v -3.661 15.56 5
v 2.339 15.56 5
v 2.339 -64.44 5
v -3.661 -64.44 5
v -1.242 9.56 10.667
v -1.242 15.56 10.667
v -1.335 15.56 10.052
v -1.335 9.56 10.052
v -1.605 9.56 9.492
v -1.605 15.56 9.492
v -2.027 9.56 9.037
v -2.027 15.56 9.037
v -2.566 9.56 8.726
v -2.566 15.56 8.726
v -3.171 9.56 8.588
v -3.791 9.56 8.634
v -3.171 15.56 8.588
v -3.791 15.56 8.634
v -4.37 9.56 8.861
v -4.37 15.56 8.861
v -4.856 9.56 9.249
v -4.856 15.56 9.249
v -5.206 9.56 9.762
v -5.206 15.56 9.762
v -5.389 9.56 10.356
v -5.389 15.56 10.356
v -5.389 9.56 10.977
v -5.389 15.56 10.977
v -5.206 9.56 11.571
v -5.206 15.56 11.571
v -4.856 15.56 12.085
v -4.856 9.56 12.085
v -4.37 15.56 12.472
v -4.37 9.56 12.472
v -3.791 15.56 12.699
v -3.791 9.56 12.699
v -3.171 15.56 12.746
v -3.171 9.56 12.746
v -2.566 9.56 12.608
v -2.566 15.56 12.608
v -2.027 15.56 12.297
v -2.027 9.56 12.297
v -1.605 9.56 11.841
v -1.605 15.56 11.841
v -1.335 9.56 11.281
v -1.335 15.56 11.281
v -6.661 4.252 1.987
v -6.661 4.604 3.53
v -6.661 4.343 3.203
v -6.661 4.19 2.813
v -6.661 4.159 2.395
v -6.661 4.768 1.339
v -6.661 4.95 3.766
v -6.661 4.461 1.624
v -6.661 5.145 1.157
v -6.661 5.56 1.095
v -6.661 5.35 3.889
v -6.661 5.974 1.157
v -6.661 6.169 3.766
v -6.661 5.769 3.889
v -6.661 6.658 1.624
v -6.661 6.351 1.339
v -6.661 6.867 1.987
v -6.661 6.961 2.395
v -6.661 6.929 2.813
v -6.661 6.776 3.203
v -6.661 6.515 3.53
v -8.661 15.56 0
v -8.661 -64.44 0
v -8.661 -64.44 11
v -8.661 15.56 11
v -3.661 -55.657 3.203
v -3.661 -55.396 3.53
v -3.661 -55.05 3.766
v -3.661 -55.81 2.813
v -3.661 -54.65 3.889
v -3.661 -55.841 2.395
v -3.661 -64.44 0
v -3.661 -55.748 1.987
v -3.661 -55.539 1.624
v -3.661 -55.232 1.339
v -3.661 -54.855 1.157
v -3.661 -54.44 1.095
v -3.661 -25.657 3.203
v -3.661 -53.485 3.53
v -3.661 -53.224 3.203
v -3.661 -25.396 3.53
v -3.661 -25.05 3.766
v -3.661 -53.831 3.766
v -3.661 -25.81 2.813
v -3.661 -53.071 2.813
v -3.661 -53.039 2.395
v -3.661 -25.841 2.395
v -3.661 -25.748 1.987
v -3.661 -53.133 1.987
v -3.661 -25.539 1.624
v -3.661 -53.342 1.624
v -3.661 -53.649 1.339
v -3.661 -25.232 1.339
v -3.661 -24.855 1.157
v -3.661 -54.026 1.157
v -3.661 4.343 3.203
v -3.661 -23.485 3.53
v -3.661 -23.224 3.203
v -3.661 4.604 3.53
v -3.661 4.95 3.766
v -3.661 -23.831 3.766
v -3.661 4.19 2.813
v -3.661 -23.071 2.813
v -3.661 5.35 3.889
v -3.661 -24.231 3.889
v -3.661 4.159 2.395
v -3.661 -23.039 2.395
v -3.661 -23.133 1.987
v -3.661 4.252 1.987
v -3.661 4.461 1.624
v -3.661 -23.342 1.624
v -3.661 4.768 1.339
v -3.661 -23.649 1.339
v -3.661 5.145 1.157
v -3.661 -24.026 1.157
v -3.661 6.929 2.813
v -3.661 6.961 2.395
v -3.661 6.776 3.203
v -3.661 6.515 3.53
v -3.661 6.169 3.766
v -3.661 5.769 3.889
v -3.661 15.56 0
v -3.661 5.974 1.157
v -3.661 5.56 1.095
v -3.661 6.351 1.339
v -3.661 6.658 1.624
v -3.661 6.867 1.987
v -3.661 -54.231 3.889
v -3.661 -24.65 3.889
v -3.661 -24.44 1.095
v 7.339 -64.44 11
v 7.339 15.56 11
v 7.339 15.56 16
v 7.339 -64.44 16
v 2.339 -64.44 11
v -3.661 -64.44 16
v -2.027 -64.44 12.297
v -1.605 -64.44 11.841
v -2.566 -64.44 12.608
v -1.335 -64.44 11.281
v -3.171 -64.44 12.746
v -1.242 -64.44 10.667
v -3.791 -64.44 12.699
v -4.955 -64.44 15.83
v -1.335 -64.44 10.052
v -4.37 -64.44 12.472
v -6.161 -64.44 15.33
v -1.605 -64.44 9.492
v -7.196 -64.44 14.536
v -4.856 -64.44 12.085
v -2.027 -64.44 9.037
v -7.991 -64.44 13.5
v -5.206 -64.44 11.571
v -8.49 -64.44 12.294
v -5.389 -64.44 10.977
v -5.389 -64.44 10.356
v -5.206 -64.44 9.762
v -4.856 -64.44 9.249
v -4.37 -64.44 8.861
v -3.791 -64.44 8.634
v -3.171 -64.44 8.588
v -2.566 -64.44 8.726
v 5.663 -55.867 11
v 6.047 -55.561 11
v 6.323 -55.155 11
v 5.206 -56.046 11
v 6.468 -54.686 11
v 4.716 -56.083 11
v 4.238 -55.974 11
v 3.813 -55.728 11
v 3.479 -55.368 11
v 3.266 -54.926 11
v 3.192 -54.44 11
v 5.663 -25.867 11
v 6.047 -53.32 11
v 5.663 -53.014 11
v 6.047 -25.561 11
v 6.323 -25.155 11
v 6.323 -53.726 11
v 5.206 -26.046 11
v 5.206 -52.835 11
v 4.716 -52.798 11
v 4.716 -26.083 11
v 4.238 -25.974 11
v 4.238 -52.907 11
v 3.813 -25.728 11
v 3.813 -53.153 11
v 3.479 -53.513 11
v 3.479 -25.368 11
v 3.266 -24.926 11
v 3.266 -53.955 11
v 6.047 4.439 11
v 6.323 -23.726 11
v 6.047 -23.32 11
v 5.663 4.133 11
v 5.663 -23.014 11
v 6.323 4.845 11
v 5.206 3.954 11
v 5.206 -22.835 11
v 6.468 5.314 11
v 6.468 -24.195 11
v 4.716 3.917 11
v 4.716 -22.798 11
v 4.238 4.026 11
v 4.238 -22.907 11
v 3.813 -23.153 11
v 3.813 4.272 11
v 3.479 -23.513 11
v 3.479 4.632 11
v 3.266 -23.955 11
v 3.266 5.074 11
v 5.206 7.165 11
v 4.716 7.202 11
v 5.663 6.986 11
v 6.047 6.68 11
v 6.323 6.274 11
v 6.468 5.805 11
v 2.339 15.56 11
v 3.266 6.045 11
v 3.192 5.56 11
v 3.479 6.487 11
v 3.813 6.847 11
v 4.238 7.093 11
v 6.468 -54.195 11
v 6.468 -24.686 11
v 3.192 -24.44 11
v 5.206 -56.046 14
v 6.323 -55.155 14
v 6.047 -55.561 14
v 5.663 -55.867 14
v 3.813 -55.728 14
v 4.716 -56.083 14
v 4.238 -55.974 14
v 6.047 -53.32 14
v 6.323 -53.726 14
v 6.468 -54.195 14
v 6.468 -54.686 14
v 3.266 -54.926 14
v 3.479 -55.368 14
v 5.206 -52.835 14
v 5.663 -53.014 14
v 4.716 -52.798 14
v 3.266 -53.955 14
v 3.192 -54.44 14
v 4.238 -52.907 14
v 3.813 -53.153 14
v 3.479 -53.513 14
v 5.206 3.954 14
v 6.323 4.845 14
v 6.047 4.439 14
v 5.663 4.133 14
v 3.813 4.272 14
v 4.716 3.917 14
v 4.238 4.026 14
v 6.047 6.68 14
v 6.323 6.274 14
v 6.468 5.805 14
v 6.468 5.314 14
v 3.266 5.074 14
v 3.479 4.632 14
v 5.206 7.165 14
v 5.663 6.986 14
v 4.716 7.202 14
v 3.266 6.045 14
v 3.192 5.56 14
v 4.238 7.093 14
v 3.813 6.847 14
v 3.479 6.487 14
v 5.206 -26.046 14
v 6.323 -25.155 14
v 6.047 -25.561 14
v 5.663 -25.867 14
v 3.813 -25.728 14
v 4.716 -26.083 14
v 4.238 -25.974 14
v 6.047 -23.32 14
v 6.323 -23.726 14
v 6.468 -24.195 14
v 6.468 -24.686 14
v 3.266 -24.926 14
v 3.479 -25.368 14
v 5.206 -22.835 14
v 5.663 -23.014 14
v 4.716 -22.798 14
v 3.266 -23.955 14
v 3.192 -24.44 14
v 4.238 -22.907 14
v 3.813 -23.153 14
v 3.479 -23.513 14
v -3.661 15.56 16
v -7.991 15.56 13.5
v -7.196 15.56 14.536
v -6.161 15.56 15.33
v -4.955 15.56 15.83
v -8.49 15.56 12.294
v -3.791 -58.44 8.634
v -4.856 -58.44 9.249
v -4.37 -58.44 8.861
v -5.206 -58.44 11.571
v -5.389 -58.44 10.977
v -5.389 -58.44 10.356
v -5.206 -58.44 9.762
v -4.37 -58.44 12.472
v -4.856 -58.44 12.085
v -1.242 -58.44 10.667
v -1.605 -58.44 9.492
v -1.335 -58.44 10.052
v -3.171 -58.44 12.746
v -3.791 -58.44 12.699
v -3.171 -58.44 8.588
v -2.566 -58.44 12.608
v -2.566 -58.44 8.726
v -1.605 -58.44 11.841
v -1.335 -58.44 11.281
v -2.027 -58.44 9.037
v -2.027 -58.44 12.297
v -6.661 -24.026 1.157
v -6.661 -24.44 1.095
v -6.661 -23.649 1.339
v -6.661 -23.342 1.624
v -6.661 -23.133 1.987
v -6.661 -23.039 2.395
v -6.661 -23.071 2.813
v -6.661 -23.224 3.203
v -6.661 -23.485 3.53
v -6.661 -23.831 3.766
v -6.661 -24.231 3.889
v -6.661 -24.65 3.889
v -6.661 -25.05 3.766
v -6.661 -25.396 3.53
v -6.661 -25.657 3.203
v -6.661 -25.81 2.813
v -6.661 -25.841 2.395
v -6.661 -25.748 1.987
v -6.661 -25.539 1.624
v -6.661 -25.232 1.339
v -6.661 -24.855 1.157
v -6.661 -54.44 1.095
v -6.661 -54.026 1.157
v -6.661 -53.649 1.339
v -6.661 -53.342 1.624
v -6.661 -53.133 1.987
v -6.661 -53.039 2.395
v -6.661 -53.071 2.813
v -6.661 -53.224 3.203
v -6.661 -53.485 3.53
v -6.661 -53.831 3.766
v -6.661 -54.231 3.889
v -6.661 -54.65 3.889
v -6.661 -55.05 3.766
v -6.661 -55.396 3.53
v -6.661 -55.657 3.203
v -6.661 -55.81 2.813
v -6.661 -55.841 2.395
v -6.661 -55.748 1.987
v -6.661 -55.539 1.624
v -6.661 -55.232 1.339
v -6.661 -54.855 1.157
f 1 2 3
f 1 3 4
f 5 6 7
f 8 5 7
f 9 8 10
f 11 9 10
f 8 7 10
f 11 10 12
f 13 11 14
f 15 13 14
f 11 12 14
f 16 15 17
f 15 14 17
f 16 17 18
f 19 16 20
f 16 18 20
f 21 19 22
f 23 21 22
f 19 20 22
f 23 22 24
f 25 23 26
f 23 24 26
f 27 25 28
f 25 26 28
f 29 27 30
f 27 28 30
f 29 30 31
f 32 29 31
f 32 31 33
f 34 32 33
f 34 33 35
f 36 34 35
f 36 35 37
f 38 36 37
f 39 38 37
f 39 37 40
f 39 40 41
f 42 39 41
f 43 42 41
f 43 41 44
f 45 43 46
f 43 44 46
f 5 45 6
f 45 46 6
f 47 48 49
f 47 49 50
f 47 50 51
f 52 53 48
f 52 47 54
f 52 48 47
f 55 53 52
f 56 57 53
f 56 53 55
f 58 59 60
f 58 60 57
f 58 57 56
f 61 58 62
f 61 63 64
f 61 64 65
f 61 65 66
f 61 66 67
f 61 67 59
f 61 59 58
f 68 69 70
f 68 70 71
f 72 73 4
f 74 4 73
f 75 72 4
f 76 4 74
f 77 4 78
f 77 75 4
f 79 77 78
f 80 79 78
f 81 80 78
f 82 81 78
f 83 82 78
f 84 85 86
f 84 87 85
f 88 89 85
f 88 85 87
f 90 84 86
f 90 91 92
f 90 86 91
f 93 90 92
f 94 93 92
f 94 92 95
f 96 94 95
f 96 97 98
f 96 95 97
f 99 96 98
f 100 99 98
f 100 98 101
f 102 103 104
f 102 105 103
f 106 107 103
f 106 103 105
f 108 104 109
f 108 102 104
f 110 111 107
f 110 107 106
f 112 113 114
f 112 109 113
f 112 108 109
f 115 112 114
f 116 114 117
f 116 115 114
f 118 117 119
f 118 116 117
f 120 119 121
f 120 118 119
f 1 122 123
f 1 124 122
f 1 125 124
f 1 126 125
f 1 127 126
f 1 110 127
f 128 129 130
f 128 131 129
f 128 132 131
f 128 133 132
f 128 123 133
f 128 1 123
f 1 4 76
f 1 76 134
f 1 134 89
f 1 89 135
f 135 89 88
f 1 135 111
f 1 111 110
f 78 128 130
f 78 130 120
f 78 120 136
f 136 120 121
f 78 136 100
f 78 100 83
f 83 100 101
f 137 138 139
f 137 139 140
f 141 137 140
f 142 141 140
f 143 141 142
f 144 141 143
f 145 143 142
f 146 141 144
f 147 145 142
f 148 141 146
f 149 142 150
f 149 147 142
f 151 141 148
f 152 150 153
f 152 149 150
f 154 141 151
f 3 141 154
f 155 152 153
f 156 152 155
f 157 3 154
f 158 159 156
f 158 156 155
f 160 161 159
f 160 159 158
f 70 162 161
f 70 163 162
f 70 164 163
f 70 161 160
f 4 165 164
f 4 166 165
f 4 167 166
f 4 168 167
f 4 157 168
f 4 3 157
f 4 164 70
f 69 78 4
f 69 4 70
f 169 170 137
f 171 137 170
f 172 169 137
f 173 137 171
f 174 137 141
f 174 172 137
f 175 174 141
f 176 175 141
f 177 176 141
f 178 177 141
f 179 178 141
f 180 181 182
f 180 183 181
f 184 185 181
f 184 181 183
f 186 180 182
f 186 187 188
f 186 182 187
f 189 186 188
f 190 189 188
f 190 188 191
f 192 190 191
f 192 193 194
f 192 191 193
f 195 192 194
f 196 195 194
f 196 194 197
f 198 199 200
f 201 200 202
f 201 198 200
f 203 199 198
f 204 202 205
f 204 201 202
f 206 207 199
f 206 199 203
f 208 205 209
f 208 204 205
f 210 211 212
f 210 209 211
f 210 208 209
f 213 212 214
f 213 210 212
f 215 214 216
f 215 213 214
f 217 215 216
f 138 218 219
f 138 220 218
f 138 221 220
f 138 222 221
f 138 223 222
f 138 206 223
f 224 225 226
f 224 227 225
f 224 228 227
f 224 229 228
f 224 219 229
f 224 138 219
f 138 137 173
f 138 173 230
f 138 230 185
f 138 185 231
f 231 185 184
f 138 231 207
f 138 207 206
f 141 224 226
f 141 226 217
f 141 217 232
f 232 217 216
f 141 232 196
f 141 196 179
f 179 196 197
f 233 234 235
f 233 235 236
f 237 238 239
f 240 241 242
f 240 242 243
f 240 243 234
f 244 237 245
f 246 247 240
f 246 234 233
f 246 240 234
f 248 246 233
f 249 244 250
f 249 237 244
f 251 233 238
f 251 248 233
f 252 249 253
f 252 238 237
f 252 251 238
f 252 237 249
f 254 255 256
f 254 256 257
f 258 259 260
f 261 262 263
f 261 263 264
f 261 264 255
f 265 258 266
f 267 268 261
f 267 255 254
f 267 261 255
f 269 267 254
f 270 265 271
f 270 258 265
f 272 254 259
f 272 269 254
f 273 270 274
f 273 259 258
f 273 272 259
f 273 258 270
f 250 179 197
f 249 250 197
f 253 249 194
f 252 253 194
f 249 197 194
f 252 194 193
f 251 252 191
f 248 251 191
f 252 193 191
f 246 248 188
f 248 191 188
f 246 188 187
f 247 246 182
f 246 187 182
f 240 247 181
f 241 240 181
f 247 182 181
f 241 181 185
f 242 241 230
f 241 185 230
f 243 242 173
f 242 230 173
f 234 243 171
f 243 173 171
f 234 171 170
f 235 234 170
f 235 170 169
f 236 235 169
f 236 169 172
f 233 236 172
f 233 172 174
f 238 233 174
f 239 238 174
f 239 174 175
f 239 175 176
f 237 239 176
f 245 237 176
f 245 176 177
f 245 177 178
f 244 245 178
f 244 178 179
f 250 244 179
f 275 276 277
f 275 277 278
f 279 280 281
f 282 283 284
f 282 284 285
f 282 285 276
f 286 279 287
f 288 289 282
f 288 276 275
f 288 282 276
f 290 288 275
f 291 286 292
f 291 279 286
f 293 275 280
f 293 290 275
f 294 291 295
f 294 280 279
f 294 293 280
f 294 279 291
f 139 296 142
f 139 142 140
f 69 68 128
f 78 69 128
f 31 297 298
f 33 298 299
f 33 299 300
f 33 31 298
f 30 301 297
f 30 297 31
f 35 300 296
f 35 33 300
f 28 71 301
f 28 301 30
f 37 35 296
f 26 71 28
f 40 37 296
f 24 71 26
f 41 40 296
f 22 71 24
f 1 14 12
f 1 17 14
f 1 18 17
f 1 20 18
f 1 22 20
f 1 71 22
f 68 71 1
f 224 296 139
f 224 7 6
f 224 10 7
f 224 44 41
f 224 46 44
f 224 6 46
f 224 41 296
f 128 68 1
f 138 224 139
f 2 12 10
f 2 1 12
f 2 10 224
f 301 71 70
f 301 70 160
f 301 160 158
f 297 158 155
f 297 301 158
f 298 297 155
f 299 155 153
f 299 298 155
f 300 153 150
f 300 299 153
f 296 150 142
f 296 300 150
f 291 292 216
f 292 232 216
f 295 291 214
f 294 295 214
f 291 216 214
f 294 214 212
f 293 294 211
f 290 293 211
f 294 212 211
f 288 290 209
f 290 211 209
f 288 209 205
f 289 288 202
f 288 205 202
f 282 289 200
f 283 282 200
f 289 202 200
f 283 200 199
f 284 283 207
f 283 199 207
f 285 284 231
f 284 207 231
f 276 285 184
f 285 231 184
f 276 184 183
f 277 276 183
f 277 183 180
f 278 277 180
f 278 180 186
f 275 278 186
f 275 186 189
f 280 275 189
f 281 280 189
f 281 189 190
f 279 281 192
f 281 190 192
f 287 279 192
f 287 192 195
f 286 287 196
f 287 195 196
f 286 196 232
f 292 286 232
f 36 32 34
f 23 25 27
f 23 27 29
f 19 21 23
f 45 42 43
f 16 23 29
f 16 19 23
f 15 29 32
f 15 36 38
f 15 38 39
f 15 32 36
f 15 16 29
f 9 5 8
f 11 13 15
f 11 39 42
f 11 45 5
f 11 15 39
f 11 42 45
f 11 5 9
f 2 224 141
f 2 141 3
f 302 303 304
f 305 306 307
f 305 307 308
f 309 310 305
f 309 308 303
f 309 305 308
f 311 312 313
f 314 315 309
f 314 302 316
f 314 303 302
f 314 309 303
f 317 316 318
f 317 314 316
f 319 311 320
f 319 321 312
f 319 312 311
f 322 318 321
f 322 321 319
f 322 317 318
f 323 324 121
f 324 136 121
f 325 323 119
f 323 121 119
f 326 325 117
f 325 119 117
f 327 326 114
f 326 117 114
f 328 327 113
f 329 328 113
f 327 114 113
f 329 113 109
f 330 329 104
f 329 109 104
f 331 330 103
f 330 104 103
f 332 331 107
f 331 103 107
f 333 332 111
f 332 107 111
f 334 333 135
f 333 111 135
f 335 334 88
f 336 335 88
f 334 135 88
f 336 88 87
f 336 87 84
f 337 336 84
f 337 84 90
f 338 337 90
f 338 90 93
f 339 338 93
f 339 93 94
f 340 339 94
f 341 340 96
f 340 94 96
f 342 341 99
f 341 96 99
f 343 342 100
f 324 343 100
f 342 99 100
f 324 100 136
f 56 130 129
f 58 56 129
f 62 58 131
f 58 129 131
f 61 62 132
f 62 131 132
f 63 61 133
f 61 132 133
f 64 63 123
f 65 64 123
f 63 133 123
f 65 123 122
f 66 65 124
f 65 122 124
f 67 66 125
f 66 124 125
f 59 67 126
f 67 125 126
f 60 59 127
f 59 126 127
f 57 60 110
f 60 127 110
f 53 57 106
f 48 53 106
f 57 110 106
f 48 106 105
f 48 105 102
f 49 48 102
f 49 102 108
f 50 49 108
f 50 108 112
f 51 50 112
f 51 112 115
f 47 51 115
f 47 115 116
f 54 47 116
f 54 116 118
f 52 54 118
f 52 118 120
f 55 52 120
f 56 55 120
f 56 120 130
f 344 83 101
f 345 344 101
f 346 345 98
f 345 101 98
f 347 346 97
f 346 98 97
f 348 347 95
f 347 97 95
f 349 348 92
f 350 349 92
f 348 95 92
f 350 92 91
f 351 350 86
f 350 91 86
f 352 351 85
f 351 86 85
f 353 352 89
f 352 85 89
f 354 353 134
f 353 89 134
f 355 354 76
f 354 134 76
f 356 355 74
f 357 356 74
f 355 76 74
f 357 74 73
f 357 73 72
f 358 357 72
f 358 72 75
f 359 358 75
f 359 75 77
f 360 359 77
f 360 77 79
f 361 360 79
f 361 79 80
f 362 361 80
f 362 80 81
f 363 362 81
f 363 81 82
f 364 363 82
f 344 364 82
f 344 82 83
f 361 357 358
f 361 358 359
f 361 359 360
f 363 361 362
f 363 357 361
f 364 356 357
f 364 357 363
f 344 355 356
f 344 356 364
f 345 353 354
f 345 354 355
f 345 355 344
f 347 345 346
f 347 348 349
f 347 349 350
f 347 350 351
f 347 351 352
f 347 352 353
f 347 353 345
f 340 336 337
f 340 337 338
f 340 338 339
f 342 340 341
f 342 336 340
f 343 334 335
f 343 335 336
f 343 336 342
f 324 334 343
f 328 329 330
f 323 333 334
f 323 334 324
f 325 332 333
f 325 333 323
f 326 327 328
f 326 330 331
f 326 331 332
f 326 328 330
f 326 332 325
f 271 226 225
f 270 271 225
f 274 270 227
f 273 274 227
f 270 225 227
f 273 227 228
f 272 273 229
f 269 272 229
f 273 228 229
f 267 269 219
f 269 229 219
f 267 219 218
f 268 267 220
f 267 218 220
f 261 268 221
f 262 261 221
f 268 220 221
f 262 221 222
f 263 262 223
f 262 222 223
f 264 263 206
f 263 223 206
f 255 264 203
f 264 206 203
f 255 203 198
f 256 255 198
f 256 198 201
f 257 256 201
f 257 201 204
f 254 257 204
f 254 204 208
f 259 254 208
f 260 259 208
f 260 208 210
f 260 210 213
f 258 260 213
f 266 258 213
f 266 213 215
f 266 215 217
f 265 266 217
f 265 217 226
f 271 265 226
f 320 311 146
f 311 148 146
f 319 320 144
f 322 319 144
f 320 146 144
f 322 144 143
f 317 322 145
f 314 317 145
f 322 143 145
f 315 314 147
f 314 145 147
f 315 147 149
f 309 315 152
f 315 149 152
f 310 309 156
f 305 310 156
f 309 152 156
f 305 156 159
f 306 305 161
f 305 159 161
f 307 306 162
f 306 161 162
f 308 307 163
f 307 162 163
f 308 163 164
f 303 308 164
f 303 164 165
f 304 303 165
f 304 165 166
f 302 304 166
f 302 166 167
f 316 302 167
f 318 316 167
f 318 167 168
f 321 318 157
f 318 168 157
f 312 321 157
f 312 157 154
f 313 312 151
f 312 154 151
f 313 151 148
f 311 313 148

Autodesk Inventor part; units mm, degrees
ref_plane "YZ Plane" through (0, 0, 0) normal (1, 0, 0) x (0, 1, 0)
ref_plane "XZ Plane" through (0, 0, 0) normal (0, 1, 0) x (-1, 0, 0)
ref_plane "XY Plane" through (0, 0, 0) normal (0, 0, 1) x (1, 0, 0)
sketch "Sketch1" plane through (0, 0, 0) normal (0, 0, 1) x (1, 0, 0)
  line L0 (-8.6606, 15.5596) -> (7.3394, 15.5596)
  line L1 (7.3394, 15.5596) -> (7.3394, -64.4404)
  line L2 (7.3394, -64.4404) -> (-8.6606, -64.4404)
  line L3 (-8.6606, -64.4404) -> (-8.6606, 15.5596)
  point P0 (0, 0)
  dimension "d2" = 16
  dimension "d3" = 80
extrude "Extrusion1" add sketch "Sketch1" along normal blind 16
sketch "Sketch2" plane through (-8.6606, 15.5596, 0) normal (0, 1, 0) x (1, 0, 0)
  line L0 (16, 0) -> (16, -16) projected
  line L1 (16, -11) -> (11, -11)
  line L2 (11, -11) -> (11, -5)
  line L3 (11, -5) -> (16, -5)
  line L4 (16, -5) -> (16, -11)
  line L5 (16, 0) -> (0, 0) projected
  line L6 (5, 0) -> (11, 0)
  line L7 (11, 0) -> (11, -5)
  line L8 (11, -5) -> (5, -5)
  line L9 (5, -5) -> (5, 0)
  line L10 (16, -16) -> (0, -16) projected
  line L11 (0, 0) -> (0, -16) projected
  point P0 (8.6606, 0)
  point P1 (5, -16)
  point P2 (0, -11)
  dimension "d5" = 5
  dimension "d6" = 5
  dimension "d7" = 5
  dimension "d8" = 5
  dimension "d9" = 5
  dimension "d10" = 5
extrude "Extrusion2" cut sketch "Sketch2" against normal blind 80 contours L0 L3 L7 L5 | L0 L1 L2 L3 | L7 L8 L9 L5
sketch "Sketch4" plane through (-8.6606, 15.5596, 16) normal (0, 1, 0) x (1, 0, 0)
  line L0 (6.9788, 8.1833) -> (8.6242, 5.3333)
  line L1 (8.6242, 5.3333) -> (6.9788, 2.4833)
  line L2 (6.9788, 2.4833) -> (3.6879, 2.4833)
  line L3 (3.6879, 2.4833) -> (2.0424, 5.3333)
  line L4 (2.0424, 5.3333) -> (3.6879, 8.1833)
  line L5 (3.6879, 8.1833) -> (6.9788, 8.1833)
  line L6 (16, 0) -> (0, 0) projected
  line L7 (0, 16) -> (0, 0) projected
  circle A0 centre (5.3333, 5.3333) radius 2.085
  point P0 (8.6606, 16)
  dimension "d13" = 5.3333
  dimension "d14" = 5.3333
  dimension "d15" = 5.7
  dimension "d23" = 4.17
extrude "Extrusion3" cut sketch "Sketch4" against normal blind 6 from surface at 0 contours A0
sketch "Sketch5" plane through (-8.6606, -64.4404, 16) normal (0, -1, 0) x (1, 0, 0)
  line L0 (3.6879, -2.4833) -> (2.0424, -5.3333) projected
  line L1 (3.6879, -2.4833) -> (6.9788, -2.4833)
  line L2 (6.9788, -2.4833) -> (8.6242, -5.3333)
  line L3 (8.6242, -5.3333) -> (6.9788, -8.1833)
  line L4 (6.9788, -8.1833) -> (3.6879, -8.1833)
  line L5 (3.6879, -8.1833) -> (2.0424, -5.3333)
  line L6 (2.0424, -5.3333) -> (3.6879, -2.4833)
  line L7 (0, 0) -> (16, 0) projected
  line L8 (0, -16) -> (0, 0) projected
  circle A0 centre (5.3333, -5.3333) radius 2.085
  point P0 (8.6606, -16)
  dimension "d18" = 5.3333
  dimension "d19" = 5.3333
  dimension "d24" = 4.17
extrude "Extrusion4" cut sketch "Sketch5" against normal blind 6 contours A0
fillet "Fillet2" radius 5 1 edges at (-8.6606, -24.4404, 16)
sketch "Sketch6" plane through (-3.6606, 15.5596, 5) normal (1, 0, 0) x (0, 0, -1)
  circle A0 centre (2.5, -10) radius 1.405
  line L0 (5, 0) -> (5, -80) projected
  line L1 (0, 0) -> (5, 0) projected
  point P0 (5, -15.5596)
  dimension "d25" = 2.81
  dimension "d26" = 2.5
  dimension "d27" = 10
extrude "Extrusion5" cut sketch "Sketch6" against normal blind 3
pattern_linear "Rectangular Pattern1" count 3 spacing 30 along (0, -1, 0) of "Extrusion5"
sketch "Sketch7" plane through (7.3394, 15.5596, 11) normal (0, 0, -1) x (-1, 0, 0)
  circle A0 centre (2.5, -10) radius 1.647
  line L0 (0, 0) -> (5, 0) projected
  line L1 (0, -80) -> (0, 0) projected
  point P0 (7.3394, -15.5596)
  dimension "d33" = 10
  dimension "d34" = 2.5
extrude "Extrusion6" cut sketch "Sketch7" against normal blind 3
pattern_linear "Rectangular Pattern2" count 3 spacing 30 along (0, -1, 0) of "Extrusion6"
equation "\"d2\" = SheetThickness + 2 * CornerOffset"
equation "\"d3\" = BoxHeight"
equation "\"d0\" = SheetThickness + 2 * CornerOffset"
equation "\"d5\" = CornerOffset"
equation "\"d6\" = CornerOffset"
equation "\"d7\" = CornerOffset"
equation "\"d8\" = CornerOffset"
equation "\"d9\" = CornerOffset"
equation "\"d10\" = CornerOffset"
equation "\"d11\" = BoxHeight"
equation "\"d13\" = 0.666667 * CornerOffset + 0.333333 * SheetThickness"
equation "\"d14\" = 0.666667 * CornerOffset + 0.333333 * SheetThickness"
equation "\"d15\" = NutS"
equation "\"d23\" = NutThreadD2"
equation "\"d16\" = NutThreadL"
equation "\"d18\" = 0.666667 * CornerOffset + 0.333333 * SheetThickness"
equation "\"d24\" = NutThreadD2"
equation "\"d20\" = NutThreadL"
equation "\"d25\" = SideNutThreadd2"
equation "\"d26\" = SideNutWidth"
equation "\"d27\" = SideNutDistance"
equation "\"d33\" = SideNutDistance"
equation "\"d34\" = SideNutWidth"
equation "\"BoxHeight\" = 80"
equation "\"SheetThickness\" = 6"
equation "\"CornerOffset\" = 5"
equation "\"NutM\" = 2.7"
equation "\"NutS\" = 5.7"
equation "\"NutThreadD2\" = 4.17"
equation "\"NutThreadL\" = 6"
equation "\"SideNutThreadd2\" = 2.81"
equation "\"SideNutDistance\" = 10"
equation "\"SideNutWidth\" = 2.5"
properties part number "Corner"
